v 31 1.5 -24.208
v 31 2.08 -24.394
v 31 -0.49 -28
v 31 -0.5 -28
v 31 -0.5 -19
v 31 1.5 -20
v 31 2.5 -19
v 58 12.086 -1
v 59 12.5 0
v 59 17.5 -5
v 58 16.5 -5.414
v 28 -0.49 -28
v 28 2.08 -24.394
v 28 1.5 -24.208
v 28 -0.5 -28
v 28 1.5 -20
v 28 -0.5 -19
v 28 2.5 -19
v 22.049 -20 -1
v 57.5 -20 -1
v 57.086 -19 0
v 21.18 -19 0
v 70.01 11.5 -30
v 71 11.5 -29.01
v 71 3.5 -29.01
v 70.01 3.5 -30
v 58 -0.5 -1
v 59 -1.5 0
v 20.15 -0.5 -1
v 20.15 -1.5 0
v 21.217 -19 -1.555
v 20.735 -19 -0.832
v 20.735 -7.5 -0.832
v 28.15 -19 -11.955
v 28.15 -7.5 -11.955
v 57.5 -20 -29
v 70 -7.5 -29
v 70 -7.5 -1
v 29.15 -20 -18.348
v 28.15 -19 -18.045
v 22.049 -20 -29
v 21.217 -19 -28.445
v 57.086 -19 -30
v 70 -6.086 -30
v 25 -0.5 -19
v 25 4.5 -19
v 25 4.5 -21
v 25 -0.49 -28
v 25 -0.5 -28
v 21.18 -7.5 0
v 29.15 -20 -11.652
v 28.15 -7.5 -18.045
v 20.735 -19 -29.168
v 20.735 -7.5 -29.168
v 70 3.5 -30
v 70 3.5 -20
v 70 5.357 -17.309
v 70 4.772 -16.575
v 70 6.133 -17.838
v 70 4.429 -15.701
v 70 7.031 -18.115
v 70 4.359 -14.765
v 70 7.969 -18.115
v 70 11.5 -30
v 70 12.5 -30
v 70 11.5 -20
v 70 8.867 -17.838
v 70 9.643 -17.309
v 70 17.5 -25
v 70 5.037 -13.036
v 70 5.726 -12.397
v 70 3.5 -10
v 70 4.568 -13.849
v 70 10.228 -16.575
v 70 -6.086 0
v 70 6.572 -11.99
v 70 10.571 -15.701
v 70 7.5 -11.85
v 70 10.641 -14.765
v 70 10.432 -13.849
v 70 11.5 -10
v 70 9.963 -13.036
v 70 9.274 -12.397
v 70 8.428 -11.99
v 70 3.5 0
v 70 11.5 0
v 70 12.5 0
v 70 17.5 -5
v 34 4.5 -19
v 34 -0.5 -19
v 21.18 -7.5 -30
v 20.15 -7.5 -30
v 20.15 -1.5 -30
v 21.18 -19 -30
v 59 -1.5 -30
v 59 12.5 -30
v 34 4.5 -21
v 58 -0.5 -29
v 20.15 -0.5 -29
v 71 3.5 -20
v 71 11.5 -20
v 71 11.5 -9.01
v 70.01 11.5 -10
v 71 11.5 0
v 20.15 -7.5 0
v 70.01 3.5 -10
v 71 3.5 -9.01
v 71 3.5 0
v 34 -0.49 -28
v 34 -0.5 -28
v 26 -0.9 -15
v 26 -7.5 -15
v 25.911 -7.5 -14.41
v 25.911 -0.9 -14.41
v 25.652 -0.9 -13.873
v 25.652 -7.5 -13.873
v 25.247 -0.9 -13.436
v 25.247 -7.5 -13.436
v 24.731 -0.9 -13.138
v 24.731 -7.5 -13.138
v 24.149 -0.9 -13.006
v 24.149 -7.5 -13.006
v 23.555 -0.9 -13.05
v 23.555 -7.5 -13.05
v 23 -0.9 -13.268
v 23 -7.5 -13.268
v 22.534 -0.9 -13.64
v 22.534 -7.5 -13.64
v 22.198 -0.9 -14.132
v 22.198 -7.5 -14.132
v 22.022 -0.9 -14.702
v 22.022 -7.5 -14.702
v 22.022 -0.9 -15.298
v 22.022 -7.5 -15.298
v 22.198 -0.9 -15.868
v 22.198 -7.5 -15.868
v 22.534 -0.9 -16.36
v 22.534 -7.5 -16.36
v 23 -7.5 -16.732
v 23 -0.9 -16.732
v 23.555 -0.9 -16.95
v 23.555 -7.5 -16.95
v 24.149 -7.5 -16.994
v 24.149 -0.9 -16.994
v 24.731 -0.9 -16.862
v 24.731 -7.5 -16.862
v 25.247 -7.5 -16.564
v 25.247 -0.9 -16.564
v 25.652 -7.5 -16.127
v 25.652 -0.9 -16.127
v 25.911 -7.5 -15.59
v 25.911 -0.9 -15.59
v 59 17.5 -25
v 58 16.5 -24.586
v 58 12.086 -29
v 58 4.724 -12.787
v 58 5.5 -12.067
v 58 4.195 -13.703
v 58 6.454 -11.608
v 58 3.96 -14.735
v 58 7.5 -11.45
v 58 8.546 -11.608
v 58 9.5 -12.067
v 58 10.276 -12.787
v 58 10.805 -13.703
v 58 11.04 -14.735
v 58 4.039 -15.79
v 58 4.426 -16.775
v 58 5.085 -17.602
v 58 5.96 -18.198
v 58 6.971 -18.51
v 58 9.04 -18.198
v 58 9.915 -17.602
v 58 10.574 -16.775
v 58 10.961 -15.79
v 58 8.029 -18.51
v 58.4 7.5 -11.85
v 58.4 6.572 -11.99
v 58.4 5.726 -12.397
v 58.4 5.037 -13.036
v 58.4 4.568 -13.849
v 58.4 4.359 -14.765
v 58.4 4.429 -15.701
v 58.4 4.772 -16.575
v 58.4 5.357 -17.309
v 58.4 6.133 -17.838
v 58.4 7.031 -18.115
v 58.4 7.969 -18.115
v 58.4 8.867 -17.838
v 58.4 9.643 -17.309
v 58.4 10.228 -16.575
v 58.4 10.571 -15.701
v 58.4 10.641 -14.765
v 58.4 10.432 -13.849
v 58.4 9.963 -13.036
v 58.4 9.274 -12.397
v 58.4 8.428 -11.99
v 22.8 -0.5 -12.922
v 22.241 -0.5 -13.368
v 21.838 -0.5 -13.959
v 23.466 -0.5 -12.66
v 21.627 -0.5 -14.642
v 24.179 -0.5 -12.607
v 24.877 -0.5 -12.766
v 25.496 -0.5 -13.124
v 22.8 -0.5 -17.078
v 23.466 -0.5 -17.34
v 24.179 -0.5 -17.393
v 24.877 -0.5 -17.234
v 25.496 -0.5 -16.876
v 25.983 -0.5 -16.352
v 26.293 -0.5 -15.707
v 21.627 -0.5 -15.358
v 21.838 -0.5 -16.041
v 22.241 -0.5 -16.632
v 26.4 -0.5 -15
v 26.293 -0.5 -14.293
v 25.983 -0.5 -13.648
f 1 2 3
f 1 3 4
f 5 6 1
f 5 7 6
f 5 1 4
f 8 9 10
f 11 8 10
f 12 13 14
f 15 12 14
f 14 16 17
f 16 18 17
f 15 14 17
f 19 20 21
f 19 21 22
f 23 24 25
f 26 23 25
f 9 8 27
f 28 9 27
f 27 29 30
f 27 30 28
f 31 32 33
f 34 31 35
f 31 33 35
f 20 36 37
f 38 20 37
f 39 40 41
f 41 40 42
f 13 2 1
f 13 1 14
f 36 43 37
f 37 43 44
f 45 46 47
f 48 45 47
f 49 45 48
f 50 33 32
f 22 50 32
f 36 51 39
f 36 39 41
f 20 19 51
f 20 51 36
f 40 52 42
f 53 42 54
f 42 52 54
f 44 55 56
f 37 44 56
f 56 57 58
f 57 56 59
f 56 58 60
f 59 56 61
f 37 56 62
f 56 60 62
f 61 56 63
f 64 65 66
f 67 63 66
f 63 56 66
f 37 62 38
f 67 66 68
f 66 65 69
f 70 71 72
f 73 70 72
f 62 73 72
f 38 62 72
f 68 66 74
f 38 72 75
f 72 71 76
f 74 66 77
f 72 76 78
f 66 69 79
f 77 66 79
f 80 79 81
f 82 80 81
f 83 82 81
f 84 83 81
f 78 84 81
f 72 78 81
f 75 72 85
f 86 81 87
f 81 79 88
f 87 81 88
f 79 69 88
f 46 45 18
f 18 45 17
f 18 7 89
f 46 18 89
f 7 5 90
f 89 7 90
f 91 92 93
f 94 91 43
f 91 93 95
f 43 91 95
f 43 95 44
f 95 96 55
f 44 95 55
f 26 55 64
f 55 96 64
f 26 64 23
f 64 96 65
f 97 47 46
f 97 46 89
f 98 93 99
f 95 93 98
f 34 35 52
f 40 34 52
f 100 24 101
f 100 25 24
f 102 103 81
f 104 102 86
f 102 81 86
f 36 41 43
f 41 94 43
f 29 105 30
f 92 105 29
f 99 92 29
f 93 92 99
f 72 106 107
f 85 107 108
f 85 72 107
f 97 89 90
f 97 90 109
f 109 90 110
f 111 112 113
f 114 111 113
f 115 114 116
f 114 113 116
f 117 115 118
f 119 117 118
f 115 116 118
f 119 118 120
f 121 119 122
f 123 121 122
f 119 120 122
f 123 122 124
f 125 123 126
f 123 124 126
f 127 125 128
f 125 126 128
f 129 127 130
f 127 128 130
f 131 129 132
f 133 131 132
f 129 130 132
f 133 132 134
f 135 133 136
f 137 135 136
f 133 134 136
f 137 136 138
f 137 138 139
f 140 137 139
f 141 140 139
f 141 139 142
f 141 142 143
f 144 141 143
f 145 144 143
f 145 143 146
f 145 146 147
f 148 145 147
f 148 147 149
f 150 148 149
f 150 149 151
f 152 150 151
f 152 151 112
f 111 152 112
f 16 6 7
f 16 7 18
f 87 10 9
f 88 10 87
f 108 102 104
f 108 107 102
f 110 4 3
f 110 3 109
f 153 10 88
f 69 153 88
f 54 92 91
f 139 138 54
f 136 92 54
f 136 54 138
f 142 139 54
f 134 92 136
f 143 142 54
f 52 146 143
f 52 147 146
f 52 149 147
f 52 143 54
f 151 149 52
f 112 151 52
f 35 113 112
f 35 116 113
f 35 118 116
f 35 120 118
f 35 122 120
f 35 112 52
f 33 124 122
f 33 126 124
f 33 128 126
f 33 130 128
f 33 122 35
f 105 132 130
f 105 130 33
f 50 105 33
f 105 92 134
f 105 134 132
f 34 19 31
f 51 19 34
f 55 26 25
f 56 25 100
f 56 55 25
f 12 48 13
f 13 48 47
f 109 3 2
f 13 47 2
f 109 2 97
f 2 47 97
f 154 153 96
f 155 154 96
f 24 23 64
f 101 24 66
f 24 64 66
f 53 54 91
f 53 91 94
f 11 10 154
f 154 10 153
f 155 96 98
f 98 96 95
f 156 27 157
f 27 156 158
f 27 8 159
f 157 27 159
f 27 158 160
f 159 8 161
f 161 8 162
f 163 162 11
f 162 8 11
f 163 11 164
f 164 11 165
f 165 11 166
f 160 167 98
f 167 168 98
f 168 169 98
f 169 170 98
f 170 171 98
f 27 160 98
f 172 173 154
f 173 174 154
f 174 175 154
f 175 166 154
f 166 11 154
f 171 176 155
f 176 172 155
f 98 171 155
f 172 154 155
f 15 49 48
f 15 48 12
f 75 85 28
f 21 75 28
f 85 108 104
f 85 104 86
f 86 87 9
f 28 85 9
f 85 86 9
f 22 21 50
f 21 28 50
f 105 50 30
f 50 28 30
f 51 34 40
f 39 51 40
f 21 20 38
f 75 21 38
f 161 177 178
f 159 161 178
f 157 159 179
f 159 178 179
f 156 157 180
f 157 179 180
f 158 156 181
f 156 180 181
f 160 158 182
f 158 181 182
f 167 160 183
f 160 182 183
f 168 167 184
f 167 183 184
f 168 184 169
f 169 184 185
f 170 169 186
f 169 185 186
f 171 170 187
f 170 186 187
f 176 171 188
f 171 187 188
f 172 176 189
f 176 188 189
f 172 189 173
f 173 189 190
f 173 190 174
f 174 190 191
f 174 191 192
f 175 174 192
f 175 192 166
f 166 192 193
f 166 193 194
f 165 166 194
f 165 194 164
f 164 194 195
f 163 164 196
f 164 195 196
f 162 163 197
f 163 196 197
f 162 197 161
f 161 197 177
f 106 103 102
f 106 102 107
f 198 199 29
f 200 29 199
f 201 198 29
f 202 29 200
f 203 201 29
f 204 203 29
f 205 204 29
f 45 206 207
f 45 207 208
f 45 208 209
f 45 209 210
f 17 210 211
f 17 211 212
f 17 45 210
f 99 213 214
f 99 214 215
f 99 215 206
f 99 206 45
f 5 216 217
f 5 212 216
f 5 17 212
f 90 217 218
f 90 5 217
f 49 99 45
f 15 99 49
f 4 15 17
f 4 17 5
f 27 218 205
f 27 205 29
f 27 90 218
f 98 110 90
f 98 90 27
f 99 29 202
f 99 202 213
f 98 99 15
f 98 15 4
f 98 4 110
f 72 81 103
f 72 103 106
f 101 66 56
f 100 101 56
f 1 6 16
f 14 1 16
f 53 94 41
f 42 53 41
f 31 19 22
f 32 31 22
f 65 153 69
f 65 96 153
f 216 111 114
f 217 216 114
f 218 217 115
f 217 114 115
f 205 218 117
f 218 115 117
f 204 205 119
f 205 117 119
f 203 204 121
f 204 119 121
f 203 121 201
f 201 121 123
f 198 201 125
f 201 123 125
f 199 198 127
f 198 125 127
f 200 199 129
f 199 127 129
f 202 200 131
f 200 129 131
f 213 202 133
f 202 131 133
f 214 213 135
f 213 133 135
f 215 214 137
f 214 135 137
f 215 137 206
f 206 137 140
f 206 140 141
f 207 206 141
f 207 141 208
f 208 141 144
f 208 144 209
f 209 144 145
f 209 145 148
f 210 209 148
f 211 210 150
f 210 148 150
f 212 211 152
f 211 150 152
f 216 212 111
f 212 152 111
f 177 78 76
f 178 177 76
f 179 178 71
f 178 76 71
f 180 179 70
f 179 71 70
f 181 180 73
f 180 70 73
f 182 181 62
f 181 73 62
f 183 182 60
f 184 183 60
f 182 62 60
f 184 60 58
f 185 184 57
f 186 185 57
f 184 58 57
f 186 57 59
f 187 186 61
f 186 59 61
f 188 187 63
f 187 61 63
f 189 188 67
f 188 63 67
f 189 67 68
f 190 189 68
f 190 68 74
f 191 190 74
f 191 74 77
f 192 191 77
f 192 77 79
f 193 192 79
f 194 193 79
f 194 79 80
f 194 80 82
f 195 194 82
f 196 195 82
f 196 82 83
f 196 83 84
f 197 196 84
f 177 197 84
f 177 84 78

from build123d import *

# Parameters (mm, degrees)
SKETCH084_W               = 50
SKETCH084_H               = 30
PAD025_DEPTH              = 25
PAD026_DEPTH              = 12.5
SKETCH086_R               = 2
POCKET054_DEPTH           = 6
SKETCH087_W               = 38
SKETCH087_H               = 30
POCKET055_DEPTH           = 18
SKETCH088_R               = 2
POCKET056_DEPTH           = 25.001
POCKET057_DEPTH           = 30.001
SKETCH090_R               = 3.15
POCKET058_DEPTH           = 50.001
SKETCH091_W               = 10
SKETCH091_H               = 8
PAD027_DEPTH              = 1
CHAMFER020_SIZE           = 5
CHAMFER021_SIZE           = 1
POCKET059_DEPTH           = 0.15
CHAMFER022_SIZE           = 0.4
CHAMFER023_SIZE           = 0.99
SKETCH142_W               = 9
SKETCH142_H               = 9
PAD043_DEPTH              = 5
CHAMFER009002001021_SIZE2 = 7
CHAMFER009002001021_SIZE  = 4.99
SKETCH143_W               = 3
SKETCH143_H               = 2
POCKET093_DEPTH           = 11.001
CHAMFER009002001022_SIZE  = 1


with BuildPart() as part:
    # Sketch084 → Pad025 (new body)
    with BuildSketch(Plane.XZ):
        with Locations((25, 15)):
            Rectangle(SKETCH084_W, SKETCH084_H)
    extrude(amount=PAD025_DEPTH)

    # Sketch085 (on Face6 of Pad025) → Pad026 (join)
    with BuildSketch(Plane.XZ.offset(25)):
        Polygon((0.180278, 30), (8.15, 18.045416), (8.15, 11.954584), (0.180278, 0), (50, 0), (50, 30), align=None)
    extrude(amount=PAD026_DEPTH)

    # Sketch086 (on Face4 of Pad026) → Pocket054 (cut)
    with BuildSketch(Plane(origin=(0, 0, 0), x_dir=(1, 0, 0), z_dir=(0, 1, 0))):
        with Locations((4, -15)):
            Circle(SKETCH086_R)
    extrude(amount=-POCKET054_DEPTH, mode=Mode.SUBTRACT)

    # Sketch087 (on Face4 of Pocket054) → Pocket055 (cut)
    with BuildSketch(Plane(origin=(0, 0, 0), x_dir=(1, 0, 0), z_dir=(0, 1, 0))):
        with Locations((19, -15)):
            Rectangle(SKETCH087_W, SKETCH087_H)
    extrude(amount=-POCKET055_DEPTH, mode=Mode.SUBTRACT)

    # Sketch088 (on Face7 of Pocket055) → Pocket056 (cut, through all)
    with BuildSketch(Plane.XZ.offset(25)):
        with Locations((4, 15)):
            Circle(SKETCH088_R)
    extrude(amount=-POCKET056_DEPTH, mode=Mode.SUBTRACT)

    # Sketch089 (on Face13 of Pocket056) → Pocket057 (cut, through all)
    with BuildSketch(Plane(origin=(0, 0, 30), x_dir=(-1, 0, 0), z_dir=(0, 0, 1))):
        Polygon((-50, 37.5), (-37.5, 37.5), (-50, 25), align=None)
    extrude(amount=-POCKET057_DEPTH, mode=Mode.SUBTRACT)

    # Sketch090 (on Face11 of Pocket057) → Pocket058 (cut, through all)
    with BuildSketch(Plane(origin=(50, 0, 0), x_dir=(0, 0, 1), z_dir=(1, 0, 0))):
        with Locations((15, 10)):
            Circle(SKETCH090_R)
    extrude(amount=-POCKET058_DEPTH, mode=Mode.SUBTRACT)

    # Sketch091 (on Face11 of Pocket058) → Pad027 (join)
    with BuildSketch(Plane(origin=(50, 0, 0), x_dir=(0, 0, 1), z_dir=(1, 0, 0))):
        with Locations((5, 10)):
            Rectangle(SKETCH091_W, SKETCH091_H)
        with Locations((25, 10)):
            Rectangle(SKETCH091_W, SKETCH091_H)
    extrude(amount=PAD027_DEPTH)

    # Chamfer020
    chamfer020_edges = [part.edges().sort_by_distance(p)[0] for p in [
        (44, 0, 30),
        (44, 0, 0),
    ]]
    chamfer(chamfer020_edges, length=CHAMFER020_SIZE)

    # Chamfer021
    chamfer021_edges = [part.edges().sort_by_distance(p)[0] for p in [
        (18.840139, -37.5, 30),
        (4.165139, -37.5, 24.022708),
        (8.15, -37.5, 15),
        (18.840139, -37.5, 0),
        (43.75, -31.25, 30),
        (43.75, -31.25, 0),
        (0.180278, -31.25, 0),
        (0.180278, -31.25, 30),
        (19, -18, 30),
        (38, -11.5, 30),
        (38, -2.5, 27.5),
        (38, 0, 15),
        (38, -2.5, 2.5),
        (38, -11.5, 0),
        (19, -18, 0),
        (4.165139, -37.5, 5.977292),
    ]]
    chamfer(chamfer021_edges, length=CHAMFER021_SIZE)

    # Chamfer021 Face21 → Pocket059 (cut)
    with BuildSketch(Plane(origin=(0, -21.515152, 15), x_dir=(0, 1, 0), z_dir=(-1, 0, 0))):
        Polygon((3.515152, -14), (3.515152, 14), (2.515152, 15), (-3.484848, 15), (-3.484848, -15), (2.515152, -15), align=None)
    extrude(amount=-POCKET059_DEPTH, mode=Mode.SUBTRACT)

    # Chamfer022
    chamfer022_edges = [part.edges().sort_by_distance(p)[0] for p in [
        (38, -10, 11.85),
        (2, -18, 15),
    ]]
    chamfer(chamfer022_edges, length=CHAMFER022_SIZE)

    # Chamfer023
    chamfer023_edges = [part.edges().sort_by_distance(p)[0] for p in [
        (51, -10, 0),
        (51, -10, 20),
    ]]
    chamfer(chamfer023_edges, length=CHAMFER023_SIZE)

    # Sketch142 (on Face34 of Chamfer023) → Pad043 (join)
    with BuildSketch(Plane(origin=(0, -18, 0), x_dir=(1, 0, 0), z_dir=(0, 1, 0))):
        with Locations((9.5, -6.5)):
            Rectangle(SKETCH142_W, SKETCH142_H)
    extrude(amount=PAD043_DEPTH)

    # Chamfer009002001021
    chamfer009002001021_edges = [part.edges().sort_by_distance(p)[0] for p in [
        (9.5, -13, 2),
    ]]
    chamfer009002001021_side = part.faces().sort_by_distance((9.5, -15.5, 2))[0]
    chamfer(chamfer009002001021_edges, length=CHAMFER009002001021_SIZE, length2=CHAMFER009002001021_SIZE2, reference=chamfer009002001021_side)

    # Sketch143 (on Face7 of Chamfer009002001021) → Pocket093 (cut, through all)
    with BuildSketch(Plane(origin=(0, 0, 11), x_dir=(-1, 0, 0), z_dir=(0, 0, 1))):
        with Locations((-9.5, 17)):
            Rectangle(SKETCH143_W, SKETCH143_H)
    extrude(amount=-POCKET093_DEPTH, mode=Mode.SUBTRACT)

    # Chamfer009002001022
    chamfer009002001022_edges = [part.edges().sort_by_distance(p)[0] for p in [
        (9.5, -16, 11),
        (9.5, -16, 4.791583),
    ]]
    chamfer(chamfer009002001022_edges, length=CHAMFER009002001022_SIZE)


with BuildPart() as part_1:
    # Body009 placement: moved
    add(part.part.moved(Location((20, 17.5, -30))))


solid = part_1.part
